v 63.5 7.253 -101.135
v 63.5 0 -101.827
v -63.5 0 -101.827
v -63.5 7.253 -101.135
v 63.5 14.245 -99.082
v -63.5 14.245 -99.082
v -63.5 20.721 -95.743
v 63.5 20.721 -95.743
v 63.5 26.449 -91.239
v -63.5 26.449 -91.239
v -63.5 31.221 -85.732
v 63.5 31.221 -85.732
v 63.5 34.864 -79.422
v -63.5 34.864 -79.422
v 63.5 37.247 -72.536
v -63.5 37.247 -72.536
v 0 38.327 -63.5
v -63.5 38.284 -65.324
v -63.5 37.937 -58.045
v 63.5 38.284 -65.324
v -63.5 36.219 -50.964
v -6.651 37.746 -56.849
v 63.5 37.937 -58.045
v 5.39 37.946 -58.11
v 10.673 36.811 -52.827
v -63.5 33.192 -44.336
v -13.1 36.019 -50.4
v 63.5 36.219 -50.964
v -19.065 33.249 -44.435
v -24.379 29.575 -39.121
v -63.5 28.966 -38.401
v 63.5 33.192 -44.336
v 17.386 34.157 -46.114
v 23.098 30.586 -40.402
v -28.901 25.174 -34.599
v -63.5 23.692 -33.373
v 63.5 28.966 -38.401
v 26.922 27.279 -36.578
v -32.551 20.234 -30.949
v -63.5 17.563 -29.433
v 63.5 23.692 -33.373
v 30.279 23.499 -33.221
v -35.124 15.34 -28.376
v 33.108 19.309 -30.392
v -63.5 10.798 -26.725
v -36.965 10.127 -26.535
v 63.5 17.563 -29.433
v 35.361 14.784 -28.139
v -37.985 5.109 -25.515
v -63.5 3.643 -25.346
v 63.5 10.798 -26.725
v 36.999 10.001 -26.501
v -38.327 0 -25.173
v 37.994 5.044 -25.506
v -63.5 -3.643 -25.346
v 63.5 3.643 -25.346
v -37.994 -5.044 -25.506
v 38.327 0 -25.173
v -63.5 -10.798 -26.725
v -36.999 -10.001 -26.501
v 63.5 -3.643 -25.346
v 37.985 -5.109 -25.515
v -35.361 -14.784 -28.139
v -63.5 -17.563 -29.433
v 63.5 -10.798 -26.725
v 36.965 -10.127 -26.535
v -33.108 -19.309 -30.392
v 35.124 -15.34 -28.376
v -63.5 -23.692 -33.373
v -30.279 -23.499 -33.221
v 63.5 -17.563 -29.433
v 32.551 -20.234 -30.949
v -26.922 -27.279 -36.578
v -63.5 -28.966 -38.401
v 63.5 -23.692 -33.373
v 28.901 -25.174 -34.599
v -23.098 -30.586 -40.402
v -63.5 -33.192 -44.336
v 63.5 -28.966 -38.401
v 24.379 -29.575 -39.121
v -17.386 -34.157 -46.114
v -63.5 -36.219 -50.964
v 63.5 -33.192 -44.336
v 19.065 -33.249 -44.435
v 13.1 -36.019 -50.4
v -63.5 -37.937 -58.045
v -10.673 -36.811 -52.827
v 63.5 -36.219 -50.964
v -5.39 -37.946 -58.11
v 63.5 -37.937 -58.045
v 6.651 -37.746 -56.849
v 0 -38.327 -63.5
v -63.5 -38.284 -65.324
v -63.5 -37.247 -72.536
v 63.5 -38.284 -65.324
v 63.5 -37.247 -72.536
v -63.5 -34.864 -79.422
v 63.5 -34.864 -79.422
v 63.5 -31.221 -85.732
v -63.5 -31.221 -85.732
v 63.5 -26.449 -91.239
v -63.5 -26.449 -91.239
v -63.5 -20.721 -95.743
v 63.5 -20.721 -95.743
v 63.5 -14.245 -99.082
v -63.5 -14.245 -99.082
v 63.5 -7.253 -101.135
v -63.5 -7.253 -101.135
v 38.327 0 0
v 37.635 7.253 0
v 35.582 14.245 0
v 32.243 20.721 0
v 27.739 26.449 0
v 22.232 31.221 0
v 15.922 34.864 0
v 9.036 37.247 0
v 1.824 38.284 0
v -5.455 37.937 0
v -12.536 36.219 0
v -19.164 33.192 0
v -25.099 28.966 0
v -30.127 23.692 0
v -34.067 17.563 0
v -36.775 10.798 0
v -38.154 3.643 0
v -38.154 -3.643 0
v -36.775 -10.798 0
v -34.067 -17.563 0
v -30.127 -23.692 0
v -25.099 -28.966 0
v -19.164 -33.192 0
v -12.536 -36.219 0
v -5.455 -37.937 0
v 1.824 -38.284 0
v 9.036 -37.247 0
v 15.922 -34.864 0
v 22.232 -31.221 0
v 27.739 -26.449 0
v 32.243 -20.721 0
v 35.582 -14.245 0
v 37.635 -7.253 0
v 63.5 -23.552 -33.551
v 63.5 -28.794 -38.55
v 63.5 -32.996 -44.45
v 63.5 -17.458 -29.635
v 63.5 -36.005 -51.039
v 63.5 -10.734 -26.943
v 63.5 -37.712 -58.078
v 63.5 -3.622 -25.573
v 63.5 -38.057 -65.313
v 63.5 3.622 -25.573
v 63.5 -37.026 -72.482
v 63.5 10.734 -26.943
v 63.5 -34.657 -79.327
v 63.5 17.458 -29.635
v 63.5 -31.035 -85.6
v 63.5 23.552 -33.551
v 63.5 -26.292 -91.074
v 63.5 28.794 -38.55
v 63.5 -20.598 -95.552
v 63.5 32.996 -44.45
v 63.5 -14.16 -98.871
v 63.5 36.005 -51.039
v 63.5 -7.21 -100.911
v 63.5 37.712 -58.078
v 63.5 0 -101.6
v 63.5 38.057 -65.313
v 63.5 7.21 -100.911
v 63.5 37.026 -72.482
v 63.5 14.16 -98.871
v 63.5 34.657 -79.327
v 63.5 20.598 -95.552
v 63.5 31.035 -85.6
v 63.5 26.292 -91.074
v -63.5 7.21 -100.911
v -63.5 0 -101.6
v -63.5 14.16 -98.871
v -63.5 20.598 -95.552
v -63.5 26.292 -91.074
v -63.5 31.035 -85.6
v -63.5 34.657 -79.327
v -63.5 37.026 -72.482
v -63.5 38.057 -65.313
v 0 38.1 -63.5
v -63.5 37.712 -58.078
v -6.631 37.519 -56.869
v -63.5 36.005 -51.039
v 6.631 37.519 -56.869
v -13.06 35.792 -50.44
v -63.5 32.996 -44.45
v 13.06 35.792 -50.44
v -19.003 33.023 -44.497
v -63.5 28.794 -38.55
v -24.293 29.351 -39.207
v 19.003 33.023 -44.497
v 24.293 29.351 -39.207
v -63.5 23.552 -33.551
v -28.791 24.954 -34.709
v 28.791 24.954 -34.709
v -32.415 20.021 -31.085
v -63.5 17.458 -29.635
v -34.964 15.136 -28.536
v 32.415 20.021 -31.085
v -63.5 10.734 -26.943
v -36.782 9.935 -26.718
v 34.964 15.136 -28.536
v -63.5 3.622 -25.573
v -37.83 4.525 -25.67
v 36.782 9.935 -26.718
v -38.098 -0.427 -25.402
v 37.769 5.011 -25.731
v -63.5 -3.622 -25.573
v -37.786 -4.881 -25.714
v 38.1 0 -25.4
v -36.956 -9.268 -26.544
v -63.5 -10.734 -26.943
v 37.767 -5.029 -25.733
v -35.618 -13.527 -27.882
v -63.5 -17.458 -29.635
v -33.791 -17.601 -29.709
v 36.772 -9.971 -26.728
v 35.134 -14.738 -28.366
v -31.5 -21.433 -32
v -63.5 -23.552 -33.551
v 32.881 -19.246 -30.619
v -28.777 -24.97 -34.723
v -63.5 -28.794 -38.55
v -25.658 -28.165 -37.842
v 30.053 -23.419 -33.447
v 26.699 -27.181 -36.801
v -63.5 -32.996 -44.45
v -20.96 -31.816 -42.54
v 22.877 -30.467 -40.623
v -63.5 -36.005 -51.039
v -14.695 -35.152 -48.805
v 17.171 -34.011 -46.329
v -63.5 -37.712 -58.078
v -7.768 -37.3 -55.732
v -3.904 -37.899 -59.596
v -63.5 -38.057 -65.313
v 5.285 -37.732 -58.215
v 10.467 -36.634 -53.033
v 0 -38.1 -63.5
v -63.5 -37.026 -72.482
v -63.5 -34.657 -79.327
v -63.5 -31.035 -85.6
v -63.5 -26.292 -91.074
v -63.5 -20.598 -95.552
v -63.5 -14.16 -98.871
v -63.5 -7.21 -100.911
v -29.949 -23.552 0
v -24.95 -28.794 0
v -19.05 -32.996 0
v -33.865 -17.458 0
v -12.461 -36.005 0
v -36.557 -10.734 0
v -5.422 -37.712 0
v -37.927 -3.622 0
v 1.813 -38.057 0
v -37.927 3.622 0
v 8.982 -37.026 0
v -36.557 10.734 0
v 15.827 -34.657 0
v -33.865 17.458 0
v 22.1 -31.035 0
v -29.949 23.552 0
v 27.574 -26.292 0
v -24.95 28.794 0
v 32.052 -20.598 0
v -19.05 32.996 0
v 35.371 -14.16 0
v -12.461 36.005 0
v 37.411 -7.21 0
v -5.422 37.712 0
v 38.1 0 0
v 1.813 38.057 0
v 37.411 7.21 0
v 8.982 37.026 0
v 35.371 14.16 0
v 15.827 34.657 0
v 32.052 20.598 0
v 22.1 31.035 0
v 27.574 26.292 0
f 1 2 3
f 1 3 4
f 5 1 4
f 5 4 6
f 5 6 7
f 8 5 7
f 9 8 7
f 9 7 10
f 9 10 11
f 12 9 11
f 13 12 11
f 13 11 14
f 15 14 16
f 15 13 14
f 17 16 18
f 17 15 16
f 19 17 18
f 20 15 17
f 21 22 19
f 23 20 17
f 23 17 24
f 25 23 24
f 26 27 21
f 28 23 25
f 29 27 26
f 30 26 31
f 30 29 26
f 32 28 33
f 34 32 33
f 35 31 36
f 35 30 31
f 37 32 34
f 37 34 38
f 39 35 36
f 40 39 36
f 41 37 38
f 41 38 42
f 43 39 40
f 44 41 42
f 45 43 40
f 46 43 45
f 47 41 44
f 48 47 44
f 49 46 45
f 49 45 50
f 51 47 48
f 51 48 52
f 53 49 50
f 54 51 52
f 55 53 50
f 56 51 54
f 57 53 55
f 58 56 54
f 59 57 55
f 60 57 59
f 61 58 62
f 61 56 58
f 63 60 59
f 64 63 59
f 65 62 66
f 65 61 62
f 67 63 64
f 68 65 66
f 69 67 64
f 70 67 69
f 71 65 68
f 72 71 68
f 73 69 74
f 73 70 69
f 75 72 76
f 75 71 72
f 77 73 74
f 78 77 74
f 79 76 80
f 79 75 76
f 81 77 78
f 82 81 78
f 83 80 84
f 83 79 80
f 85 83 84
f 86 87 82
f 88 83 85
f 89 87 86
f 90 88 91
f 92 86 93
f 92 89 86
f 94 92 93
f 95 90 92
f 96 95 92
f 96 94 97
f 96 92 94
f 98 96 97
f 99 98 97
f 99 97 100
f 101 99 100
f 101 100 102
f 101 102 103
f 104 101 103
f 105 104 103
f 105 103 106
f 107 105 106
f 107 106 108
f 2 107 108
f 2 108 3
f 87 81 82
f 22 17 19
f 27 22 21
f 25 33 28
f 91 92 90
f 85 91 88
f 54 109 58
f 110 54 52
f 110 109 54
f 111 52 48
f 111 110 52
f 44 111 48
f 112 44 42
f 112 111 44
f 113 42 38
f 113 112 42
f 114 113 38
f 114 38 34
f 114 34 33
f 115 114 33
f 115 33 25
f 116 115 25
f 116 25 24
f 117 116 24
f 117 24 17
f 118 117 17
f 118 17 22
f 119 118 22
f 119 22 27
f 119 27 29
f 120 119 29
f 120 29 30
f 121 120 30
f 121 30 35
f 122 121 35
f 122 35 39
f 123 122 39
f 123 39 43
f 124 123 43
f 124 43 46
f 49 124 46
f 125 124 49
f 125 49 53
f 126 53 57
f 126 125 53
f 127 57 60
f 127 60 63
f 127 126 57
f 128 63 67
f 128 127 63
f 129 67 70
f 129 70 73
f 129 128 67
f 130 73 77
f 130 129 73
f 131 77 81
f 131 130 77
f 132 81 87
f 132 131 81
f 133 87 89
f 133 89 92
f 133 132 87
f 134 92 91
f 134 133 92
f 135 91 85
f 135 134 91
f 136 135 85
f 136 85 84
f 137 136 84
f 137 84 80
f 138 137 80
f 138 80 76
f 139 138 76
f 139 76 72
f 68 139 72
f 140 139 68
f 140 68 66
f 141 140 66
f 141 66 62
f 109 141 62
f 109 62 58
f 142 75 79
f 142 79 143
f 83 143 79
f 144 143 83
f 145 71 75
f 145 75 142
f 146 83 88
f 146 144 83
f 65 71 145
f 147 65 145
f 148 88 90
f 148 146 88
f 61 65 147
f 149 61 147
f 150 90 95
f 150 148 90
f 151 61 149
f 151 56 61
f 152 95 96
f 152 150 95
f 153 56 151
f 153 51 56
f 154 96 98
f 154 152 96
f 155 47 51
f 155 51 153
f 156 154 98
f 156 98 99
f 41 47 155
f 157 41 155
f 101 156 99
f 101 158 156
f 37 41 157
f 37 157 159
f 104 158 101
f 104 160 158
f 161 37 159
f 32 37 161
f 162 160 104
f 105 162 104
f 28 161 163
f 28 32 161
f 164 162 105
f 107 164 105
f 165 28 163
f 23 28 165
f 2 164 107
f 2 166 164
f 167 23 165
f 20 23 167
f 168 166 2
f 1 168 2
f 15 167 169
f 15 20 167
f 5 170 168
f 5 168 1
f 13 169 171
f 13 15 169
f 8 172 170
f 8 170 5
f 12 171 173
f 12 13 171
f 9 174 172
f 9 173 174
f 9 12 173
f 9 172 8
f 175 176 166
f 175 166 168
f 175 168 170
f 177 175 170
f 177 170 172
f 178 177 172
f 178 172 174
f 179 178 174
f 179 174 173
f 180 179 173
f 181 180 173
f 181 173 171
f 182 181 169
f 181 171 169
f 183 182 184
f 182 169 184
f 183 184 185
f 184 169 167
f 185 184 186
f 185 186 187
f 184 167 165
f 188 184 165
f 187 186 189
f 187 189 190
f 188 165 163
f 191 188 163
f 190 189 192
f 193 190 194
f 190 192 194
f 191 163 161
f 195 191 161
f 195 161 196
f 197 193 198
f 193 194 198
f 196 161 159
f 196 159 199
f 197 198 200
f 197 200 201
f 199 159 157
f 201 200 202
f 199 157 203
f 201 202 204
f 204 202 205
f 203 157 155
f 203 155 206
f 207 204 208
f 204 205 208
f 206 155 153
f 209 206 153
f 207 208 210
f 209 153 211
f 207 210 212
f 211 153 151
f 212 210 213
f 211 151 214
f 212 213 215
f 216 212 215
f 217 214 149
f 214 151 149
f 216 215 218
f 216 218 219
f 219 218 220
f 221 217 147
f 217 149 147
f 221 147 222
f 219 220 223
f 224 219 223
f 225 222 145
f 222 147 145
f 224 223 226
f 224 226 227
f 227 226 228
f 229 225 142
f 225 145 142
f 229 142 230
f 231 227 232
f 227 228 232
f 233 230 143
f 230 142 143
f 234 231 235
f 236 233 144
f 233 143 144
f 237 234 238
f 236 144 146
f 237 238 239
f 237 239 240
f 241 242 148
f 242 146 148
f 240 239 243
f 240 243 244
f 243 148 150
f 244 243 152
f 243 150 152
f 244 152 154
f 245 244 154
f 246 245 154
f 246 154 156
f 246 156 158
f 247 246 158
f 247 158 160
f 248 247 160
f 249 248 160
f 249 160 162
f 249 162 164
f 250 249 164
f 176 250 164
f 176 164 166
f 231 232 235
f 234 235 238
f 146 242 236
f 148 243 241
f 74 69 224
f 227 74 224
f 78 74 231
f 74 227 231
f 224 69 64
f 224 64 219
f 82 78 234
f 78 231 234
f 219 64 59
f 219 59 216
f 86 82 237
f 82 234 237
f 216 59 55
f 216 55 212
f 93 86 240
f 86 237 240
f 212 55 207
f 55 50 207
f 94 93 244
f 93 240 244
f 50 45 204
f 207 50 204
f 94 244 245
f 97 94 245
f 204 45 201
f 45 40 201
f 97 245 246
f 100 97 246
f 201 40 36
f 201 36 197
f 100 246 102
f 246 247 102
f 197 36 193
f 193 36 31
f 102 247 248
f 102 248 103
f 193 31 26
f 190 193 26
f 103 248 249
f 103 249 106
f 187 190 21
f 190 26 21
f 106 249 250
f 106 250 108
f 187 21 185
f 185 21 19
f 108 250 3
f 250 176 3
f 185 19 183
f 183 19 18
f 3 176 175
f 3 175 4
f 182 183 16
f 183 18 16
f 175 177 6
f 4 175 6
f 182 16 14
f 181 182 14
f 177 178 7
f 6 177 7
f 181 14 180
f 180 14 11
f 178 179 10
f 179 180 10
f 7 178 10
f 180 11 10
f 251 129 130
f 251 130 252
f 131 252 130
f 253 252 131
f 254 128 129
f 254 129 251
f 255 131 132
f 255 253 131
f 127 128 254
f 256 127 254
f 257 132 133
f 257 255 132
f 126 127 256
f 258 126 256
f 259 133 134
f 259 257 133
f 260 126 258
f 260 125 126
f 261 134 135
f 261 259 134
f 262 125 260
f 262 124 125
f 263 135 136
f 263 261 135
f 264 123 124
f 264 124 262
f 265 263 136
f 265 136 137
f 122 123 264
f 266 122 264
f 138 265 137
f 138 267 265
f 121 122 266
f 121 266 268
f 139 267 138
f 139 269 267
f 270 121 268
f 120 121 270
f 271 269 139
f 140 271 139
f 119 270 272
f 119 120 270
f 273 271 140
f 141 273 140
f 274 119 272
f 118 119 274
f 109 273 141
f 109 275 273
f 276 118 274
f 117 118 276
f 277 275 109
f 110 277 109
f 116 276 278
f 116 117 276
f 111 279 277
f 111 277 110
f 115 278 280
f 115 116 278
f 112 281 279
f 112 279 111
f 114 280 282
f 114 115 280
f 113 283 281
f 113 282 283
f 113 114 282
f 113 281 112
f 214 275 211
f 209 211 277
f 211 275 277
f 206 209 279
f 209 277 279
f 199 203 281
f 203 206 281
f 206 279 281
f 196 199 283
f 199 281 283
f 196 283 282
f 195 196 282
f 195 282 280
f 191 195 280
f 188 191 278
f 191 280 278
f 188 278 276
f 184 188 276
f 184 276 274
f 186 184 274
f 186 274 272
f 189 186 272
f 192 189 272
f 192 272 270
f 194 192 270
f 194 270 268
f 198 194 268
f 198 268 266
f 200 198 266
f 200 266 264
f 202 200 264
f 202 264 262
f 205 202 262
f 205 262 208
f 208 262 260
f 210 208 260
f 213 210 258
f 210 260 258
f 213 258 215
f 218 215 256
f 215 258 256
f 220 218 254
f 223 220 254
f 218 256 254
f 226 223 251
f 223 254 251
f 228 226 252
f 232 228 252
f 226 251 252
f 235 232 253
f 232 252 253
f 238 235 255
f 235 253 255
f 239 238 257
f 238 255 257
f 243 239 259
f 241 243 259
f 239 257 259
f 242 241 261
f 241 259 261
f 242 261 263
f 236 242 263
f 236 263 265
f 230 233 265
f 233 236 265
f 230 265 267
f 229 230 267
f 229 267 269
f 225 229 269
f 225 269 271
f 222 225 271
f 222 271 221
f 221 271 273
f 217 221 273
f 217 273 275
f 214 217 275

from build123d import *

# Parameters (mm, degrees)
SKETCH1_R           = 38.32733
BOSS_EXTRUDE2_DEPTH = 63.5
SKETCH2_R           = 38.32733
BOSS_EXTRUDE3_DEPTH = 127
SKETCH3_R           = 38.1
CUT_EXTRUDE1_DEPTH  = 128
SKETCH4_R           = 38.1
CUT_EXTRUDE2_DEPTH  = 63.5


with BuildPart() as part:
    # Sketch1 → Boss-Extrude2 (new body)
    with BuildSketch(Plane.XY):
        Circle(SKETCH1_R)
    extrude(amount=-BOSS_EXTRUDE2_DEPTH)

    # Sketch2 → Boss-Extrude3 (add)
    with BuildSketch(Plane(origin=(63.5, 0, 0), x_dir=(0, 0, -1), z_dir=(1, 0, 0))):
        with Locations((63.5, 0)):
            Circle(SKETCH2_R)
    extrude(amount=-BOSS_EXTRUDE3_DEPTH)

    # Sketch3 → Cut-Extrude1 (cut, through all)
    with BuildSketch(Plane(origin=(63.5, 0, 0), x_dir=(0, 0, -1), z_dir=(1, 0, 0))):
        with Locations((63.5, 0)):
            Circle(SKETCH3_R)
    extrude(amount=-CUT_EXTRUDE1_DEPTH, mode=Mode.SUBTRACT)

    # Sketch4 → Cut-Extrude2 (cut)
    with BuildSketch(Plane.XY):
        Circle(SKETCH4_R)
    extrude(amount=-CUT_EXTRUDE2_DEPTH, mode=Mode.SUBTRACT)


solid = part.part
